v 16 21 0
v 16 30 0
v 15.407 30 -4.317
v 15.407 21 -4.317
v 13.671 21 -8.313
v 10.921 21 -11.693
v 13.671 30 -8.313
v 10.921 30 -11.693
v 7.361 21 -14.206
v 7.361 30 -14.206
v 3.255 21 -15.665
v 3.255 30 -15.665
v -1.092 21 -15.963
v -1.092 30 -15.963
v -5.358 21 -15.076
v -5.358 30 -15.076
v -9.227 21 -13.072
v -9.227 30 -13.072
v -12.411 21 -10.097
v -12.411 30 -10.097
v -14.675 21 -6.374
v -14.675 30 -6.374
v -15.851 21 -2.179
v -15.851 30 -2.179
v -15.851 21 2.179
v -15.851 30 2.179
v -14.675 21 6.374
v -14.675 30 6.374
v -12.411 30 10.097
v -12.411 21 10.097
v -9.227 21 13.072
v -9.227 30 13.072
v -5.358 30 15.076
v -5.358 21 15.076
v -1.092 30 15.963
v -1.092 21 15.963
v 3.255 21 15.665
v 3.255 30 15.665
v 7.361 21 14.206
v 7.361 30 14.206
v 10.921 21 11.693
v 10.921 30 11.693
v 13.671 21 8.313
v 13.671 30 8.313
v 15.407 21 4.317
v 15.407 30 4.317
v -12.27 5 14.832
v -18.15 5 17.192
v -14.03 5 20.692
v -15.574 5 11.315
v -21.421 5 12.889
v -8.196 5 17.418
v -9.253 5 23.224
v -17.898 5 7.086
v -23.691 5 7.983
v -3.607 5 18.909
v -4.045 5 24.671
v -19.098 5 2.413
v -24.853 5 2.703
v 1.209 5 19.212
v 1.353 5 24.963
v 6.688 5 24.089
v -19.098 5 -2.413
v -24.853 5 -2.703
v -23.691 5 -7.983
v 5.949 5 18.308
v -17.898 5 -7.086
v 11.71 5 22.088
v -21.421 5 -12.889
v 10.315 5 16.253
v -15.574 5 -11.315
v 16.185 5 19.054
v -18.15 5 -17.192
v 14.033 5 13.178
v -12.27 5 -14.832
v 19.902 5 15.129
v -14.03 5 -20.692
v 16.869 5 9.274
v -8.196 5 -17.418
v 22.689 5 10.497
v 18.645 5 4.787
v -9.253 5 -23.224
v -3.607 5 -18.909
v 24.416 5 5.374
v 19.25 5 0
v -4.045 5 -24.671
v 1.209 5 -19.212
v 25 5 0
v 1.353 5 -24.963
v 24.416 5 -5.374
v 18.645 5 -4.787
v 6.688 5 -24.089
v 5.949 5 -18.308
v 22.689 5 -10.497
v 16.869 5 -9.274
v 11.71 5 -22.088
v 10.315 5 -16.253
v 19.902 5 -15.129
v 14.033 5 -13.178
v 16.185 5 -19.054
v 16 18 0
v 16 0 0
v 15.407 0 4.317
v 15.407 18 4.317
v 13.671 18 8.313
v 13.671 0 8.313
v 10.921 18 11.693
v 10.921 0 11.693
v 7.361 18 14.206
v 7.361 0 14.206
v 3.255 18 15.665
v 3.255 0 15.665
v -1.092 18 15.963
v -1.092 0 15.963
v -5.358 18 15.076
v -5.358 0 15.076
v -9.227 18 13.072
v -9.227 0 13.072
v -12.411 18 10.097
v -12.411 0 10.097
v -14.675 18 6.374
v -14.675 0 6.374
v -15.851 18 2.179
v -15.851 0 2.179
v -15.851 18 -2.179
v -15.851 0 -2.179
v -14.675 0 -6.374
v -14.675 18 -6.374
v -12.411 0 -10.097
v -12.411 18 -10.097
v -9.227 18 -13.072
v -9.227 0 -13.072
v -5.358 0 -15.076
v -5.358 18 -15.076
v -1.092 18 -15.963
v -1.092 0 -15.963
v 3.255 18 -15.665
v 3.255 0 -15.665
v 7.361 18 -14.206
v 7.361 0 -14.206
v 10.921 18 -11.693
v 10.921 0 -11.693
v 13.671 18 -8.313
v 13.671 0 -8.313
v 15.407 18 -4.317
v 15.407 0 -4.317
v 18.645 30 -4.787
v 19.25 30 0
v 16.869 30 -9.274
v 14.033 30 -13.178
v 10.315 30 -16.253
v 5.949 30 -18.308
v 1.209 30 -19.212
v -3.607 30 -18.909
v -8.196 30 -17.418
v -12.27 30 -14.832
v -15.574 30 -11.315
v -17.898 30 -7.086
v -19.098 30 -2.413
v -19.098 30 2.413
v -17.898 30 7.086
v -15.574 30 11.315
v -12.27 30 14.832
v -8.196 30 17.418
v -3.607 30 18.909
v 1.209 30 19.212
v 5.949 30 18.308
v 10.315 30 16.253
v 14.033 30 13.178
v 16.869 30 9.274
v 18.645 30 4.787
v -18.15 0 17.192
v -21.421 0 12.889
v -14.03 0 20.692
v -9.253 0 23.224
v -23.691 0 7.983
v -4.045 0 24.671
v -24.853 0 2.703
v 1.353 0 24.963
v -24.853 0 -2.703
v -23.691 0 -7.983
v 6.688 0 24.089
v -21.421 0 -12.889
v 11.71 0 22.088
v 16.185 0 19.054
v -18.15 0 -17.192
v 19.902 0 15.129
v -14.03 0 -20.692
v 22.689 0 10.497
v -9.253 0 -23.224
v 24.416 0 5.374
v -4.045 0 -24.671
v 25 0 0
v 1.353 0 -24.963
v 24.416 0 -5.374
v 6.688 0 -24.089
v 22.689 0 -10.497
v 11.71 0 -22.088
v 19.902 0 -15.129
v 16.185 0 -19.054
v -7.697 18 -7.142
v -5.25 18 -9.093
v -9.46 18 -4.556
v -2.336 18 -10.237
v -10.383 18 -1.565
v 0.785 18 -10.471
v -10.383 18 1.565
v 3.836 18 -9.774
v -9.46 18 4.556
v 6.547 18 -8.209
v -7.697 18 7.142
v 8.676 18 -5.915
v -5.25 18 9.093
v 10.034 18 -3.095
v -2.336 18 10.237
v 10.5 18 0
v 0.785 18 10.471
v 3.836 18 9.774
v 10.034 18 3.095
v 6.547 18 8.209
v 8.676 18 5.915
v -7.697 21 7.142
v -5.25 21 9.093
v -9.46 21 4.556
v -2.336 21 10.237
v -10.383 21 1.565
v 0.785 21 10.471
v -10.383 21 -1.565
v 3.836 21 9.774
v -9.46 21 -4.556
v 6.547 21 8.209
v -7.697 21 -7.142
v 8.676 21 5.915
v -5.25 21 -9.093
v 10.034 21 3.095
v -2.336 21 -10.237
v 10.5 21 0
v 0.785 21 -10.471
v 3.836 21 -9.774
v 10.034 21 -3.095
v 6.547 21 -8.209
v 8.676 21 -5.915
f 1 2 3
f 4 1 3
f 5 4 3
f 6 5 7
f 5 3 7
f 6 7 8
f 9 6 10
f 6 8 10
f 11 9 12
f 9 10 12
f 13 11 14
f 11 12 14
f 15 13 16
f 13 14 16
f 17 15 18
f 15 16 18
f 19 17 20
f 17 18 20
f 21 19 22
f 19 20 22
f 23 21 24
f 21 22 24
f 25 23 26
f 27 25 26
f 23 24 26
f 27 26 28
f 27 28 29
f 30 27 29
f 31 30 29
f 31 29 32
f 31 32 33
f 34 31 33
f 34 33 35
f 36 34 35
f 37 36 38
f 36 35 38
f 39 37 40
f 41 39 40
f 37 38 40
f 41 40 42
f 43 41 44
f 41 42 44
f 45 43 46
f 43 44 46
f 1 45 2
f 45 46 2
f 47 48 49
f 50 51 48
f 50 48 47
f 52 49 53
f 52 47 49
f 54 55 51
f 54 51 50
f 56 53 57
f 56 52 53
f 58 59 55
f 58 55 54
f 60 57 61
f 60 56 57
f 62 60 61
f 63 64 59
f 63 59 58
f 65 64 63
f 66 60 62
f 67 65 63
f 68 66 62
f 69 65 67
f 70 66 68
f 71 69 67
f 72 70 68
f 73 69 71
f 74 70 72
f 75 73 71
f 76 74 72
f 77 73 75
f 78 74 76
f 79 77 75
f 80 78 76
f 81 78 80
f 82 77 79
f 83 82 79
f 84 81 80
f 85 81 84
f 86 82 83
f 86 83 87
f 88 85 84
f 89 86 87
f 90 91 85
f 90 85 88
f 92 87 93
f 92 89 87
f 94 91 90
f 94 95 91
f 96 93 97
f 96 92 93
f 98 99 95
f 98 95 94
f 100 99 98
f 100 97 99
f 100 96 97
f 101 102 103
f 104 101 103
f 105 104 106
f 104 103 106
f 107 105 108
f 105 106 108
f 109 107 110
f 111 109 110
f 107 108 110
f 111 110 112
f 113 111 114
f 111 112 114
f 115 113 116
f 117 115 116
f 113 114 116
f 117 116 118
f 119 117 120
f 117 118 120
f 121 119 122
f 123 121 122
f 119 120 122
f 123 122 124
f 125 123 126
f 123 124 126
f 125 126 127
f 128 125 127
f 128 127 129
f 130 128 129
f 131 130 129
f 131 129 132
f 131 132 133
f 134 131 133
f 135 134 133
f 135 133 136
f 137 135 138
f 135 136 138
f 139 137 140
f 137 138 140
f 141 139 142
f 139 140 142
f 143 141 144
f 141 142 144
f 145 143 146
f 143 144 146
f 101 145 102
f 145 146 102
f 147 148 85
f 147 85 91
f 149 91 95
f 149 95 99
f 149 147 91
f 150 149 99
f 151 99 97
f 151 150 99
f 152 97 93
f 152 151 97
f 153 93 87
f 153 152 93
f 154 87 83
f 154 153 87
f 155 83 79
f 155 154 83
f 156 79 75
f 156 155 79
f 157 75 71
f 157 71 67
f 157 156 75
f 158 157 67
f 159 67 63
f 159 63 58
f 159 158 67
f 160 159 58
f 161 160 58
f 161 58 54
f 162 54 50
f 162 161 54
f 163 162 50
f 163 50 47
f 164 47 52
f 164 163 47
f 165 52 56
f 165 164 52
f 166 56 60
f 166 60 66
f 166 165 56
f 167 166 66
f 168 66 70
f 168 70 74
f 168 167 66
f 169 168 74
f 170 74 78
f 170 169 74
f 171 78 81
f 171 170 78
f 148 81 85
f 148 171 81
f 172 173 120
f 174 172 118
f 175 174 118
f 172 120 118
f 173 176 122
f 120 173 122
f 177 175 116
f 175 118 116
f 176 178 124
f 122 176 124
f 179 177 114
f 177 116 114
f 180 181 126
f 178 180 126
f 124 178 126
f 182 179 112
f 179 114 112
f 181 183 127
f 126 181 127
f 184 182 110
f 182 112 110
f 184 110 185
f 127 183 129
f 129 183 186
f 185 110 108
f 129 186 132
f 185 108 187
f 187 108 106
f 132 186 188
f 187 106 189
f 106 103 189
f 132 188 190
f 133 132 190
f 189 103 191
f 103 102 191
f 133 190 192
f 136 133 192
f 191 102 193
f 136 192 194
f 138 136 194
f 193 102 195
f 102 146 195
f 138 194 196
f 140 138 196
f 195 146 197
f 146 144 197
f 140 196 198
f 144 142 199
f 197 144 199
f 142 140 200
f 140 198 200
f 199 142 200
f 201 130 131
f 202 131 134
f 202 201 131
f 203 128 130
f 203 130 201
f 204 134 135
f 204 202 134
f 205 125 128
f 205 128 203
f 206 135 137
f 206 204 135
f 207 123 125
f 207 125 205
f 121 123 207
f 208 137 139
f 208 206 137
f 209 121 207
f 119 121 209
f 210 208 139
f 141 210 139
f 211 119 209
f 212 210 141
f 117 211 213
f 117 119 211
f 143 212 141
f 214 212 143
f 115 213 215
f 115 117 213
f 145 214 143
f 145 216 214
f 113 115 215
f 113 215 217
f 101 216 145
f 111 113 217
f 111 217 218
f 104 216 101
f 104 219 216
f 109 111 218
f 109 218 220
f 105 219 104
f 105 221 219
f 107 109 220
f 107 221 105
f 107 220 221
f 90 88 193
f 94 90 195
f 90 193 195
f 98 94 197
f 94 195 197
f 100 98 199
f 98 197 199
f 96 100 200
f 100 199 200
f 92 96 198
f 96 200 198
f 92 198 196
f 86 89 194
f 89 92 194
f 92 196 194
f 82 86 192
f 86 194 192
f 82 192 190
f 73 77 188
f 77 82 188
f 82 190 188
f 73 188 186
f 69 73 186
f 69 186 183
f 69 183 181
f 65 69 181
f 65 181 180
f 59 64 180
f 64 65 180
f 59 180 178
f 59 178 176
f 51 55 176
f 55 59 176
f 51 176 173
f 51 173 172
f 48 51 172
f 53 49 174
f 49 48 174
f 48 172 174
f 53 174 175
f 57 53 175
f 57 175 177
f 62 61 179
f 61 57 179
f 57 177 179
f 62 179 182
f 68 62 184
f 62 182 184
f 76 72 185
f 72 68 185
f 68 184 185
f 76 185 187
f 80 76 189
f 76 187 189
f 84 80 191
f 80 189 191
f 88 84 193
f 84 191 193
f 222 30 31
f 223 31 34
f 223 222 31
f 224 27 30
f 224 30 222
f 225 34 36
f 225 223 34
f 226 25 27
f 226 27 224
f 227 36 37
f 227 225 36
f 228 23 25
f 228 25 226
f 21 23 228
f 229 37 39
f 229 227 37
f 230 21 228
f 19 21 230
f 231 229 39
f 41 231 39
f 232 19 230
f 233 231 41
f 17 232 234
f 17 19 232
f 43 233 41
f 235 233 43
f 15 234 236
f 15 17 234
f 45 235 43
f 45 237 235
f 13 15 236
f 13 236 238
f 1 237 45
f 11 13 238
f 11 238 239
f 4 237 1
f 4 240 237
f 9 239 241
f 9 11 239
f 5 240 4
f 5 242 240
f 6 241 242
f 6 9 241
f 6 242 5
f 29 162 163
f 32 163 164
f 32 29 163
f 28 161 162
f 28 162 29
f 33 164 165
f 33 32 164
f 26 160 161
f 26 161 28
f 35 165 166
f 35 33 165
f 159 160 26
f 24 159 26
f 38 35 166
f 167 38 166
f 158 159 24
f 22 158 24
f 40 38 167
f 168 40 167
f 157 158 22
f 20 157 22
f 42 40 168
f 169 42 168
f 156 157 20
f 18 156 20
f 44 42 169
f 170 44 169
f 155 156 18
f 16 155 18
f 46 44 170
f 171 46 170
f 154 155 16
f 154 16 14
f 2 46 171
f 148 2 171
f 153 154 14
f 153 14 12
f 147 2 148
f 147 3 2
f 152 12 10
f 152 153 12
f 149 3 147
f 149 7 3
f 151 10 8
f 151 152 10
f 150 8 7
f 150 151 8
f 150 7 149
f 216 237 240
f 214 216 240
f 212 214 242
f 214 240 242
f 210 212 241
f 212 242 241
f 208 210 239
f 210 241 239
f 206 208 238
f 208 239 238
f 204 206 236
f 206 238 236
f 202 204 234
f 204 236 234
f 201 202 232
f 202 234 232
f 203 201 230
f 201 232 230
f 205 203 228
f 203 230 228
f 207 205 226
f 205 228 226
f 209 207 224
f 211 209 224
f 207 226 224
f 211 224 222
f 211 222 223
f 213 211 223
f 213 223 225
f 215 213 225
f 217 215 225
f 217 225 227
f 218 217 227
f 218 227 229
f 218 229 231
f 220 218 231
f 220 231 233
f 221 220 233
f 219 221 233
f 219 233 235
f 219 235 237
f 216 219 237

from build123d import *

# Parameters (mm, degrees)
SKETCH1_R           = 25
BOSS_EXTRUDE1_DEPTH = 30
SKETCH2_OUTSIDE_W   = 67.362
SKETCH2_OUTSIDE_H   = 67.362
SKETCH2_OUTSIDE_R   = 19.25
CUT_EXTRUDE1_DEPTH  = 25
SKETCH3_R           = 16
CUT_EXTRUDE2_DEPTH  = 9
SKETCH4_R           = 10.5
CUT_EXTRUDE3_DEPTH  = 22
SKETCH5_R           = 16
CUT_EXTRUDE4_DEPTH  = 18


with BuildPart() as part:
    # Sketch1 → Boss-Extrude1 (new body)
    with BuildSketch(Plane(origin=(0, 0, 0), x_dir=(1, 0, 0), z_dir=(0, 1, 0))):
        Circle(SKETCH1_R)
    extrude(amount=BOSS_EXTRUDE1_DEPTH)

    # Sketch2 outside → Cut-Extrude1 (cut)
    with BuildSketch(Plane(origin=(0, 30, 0), x_dir=(1, 0, 0), z_dir=(0, 1, 0))):
        Rectangle(SKETCH2_OUTSIDE_W, SKETCH2_OUTSIDE_H)
        Circle(SKETCH2_OUTSIDE_R, mode=Mode.SUBTRACT)
    extrude(amount=-CUT_EXTRUDE1_DEPTH, mode=Mode.SUBTRACT)

    # Sketch3 → Cut-Extrude2 (cut)
    with BuildSketch(Plane(origin=(0, 30, 0), x_dir=(1, 0, 0), z_dir=(0, 1, 0))):
        Circle(SKETCH3_R)
    extrude(amount=-CUT_EXTRUDE2_DEPTH, mode=Mode.SUBTRACT)

    # Sketch4 → Cut-Extrude3 (cut, through all)
    with BuildSketch(Plane(origin=(0, 21, 0), x_dir=(1, 0, 0), z_dir=(0, 1, 0))):
        Circle(SKETCH4_R)
    extrude(amount=-CUT_EXTRUDE3_DEPTH, mode=Mode.SUBTRACT)

    # Sketch5 → Cut-Extrude4 (cut)
    with BuildSketch(Plane.XZ):
        Circle(SKETCH5_R)
    extrude(amount=-CUT_EXTRUDE4_DEPTH, mode=Mode.SUBTRACT)


solid = part.part
